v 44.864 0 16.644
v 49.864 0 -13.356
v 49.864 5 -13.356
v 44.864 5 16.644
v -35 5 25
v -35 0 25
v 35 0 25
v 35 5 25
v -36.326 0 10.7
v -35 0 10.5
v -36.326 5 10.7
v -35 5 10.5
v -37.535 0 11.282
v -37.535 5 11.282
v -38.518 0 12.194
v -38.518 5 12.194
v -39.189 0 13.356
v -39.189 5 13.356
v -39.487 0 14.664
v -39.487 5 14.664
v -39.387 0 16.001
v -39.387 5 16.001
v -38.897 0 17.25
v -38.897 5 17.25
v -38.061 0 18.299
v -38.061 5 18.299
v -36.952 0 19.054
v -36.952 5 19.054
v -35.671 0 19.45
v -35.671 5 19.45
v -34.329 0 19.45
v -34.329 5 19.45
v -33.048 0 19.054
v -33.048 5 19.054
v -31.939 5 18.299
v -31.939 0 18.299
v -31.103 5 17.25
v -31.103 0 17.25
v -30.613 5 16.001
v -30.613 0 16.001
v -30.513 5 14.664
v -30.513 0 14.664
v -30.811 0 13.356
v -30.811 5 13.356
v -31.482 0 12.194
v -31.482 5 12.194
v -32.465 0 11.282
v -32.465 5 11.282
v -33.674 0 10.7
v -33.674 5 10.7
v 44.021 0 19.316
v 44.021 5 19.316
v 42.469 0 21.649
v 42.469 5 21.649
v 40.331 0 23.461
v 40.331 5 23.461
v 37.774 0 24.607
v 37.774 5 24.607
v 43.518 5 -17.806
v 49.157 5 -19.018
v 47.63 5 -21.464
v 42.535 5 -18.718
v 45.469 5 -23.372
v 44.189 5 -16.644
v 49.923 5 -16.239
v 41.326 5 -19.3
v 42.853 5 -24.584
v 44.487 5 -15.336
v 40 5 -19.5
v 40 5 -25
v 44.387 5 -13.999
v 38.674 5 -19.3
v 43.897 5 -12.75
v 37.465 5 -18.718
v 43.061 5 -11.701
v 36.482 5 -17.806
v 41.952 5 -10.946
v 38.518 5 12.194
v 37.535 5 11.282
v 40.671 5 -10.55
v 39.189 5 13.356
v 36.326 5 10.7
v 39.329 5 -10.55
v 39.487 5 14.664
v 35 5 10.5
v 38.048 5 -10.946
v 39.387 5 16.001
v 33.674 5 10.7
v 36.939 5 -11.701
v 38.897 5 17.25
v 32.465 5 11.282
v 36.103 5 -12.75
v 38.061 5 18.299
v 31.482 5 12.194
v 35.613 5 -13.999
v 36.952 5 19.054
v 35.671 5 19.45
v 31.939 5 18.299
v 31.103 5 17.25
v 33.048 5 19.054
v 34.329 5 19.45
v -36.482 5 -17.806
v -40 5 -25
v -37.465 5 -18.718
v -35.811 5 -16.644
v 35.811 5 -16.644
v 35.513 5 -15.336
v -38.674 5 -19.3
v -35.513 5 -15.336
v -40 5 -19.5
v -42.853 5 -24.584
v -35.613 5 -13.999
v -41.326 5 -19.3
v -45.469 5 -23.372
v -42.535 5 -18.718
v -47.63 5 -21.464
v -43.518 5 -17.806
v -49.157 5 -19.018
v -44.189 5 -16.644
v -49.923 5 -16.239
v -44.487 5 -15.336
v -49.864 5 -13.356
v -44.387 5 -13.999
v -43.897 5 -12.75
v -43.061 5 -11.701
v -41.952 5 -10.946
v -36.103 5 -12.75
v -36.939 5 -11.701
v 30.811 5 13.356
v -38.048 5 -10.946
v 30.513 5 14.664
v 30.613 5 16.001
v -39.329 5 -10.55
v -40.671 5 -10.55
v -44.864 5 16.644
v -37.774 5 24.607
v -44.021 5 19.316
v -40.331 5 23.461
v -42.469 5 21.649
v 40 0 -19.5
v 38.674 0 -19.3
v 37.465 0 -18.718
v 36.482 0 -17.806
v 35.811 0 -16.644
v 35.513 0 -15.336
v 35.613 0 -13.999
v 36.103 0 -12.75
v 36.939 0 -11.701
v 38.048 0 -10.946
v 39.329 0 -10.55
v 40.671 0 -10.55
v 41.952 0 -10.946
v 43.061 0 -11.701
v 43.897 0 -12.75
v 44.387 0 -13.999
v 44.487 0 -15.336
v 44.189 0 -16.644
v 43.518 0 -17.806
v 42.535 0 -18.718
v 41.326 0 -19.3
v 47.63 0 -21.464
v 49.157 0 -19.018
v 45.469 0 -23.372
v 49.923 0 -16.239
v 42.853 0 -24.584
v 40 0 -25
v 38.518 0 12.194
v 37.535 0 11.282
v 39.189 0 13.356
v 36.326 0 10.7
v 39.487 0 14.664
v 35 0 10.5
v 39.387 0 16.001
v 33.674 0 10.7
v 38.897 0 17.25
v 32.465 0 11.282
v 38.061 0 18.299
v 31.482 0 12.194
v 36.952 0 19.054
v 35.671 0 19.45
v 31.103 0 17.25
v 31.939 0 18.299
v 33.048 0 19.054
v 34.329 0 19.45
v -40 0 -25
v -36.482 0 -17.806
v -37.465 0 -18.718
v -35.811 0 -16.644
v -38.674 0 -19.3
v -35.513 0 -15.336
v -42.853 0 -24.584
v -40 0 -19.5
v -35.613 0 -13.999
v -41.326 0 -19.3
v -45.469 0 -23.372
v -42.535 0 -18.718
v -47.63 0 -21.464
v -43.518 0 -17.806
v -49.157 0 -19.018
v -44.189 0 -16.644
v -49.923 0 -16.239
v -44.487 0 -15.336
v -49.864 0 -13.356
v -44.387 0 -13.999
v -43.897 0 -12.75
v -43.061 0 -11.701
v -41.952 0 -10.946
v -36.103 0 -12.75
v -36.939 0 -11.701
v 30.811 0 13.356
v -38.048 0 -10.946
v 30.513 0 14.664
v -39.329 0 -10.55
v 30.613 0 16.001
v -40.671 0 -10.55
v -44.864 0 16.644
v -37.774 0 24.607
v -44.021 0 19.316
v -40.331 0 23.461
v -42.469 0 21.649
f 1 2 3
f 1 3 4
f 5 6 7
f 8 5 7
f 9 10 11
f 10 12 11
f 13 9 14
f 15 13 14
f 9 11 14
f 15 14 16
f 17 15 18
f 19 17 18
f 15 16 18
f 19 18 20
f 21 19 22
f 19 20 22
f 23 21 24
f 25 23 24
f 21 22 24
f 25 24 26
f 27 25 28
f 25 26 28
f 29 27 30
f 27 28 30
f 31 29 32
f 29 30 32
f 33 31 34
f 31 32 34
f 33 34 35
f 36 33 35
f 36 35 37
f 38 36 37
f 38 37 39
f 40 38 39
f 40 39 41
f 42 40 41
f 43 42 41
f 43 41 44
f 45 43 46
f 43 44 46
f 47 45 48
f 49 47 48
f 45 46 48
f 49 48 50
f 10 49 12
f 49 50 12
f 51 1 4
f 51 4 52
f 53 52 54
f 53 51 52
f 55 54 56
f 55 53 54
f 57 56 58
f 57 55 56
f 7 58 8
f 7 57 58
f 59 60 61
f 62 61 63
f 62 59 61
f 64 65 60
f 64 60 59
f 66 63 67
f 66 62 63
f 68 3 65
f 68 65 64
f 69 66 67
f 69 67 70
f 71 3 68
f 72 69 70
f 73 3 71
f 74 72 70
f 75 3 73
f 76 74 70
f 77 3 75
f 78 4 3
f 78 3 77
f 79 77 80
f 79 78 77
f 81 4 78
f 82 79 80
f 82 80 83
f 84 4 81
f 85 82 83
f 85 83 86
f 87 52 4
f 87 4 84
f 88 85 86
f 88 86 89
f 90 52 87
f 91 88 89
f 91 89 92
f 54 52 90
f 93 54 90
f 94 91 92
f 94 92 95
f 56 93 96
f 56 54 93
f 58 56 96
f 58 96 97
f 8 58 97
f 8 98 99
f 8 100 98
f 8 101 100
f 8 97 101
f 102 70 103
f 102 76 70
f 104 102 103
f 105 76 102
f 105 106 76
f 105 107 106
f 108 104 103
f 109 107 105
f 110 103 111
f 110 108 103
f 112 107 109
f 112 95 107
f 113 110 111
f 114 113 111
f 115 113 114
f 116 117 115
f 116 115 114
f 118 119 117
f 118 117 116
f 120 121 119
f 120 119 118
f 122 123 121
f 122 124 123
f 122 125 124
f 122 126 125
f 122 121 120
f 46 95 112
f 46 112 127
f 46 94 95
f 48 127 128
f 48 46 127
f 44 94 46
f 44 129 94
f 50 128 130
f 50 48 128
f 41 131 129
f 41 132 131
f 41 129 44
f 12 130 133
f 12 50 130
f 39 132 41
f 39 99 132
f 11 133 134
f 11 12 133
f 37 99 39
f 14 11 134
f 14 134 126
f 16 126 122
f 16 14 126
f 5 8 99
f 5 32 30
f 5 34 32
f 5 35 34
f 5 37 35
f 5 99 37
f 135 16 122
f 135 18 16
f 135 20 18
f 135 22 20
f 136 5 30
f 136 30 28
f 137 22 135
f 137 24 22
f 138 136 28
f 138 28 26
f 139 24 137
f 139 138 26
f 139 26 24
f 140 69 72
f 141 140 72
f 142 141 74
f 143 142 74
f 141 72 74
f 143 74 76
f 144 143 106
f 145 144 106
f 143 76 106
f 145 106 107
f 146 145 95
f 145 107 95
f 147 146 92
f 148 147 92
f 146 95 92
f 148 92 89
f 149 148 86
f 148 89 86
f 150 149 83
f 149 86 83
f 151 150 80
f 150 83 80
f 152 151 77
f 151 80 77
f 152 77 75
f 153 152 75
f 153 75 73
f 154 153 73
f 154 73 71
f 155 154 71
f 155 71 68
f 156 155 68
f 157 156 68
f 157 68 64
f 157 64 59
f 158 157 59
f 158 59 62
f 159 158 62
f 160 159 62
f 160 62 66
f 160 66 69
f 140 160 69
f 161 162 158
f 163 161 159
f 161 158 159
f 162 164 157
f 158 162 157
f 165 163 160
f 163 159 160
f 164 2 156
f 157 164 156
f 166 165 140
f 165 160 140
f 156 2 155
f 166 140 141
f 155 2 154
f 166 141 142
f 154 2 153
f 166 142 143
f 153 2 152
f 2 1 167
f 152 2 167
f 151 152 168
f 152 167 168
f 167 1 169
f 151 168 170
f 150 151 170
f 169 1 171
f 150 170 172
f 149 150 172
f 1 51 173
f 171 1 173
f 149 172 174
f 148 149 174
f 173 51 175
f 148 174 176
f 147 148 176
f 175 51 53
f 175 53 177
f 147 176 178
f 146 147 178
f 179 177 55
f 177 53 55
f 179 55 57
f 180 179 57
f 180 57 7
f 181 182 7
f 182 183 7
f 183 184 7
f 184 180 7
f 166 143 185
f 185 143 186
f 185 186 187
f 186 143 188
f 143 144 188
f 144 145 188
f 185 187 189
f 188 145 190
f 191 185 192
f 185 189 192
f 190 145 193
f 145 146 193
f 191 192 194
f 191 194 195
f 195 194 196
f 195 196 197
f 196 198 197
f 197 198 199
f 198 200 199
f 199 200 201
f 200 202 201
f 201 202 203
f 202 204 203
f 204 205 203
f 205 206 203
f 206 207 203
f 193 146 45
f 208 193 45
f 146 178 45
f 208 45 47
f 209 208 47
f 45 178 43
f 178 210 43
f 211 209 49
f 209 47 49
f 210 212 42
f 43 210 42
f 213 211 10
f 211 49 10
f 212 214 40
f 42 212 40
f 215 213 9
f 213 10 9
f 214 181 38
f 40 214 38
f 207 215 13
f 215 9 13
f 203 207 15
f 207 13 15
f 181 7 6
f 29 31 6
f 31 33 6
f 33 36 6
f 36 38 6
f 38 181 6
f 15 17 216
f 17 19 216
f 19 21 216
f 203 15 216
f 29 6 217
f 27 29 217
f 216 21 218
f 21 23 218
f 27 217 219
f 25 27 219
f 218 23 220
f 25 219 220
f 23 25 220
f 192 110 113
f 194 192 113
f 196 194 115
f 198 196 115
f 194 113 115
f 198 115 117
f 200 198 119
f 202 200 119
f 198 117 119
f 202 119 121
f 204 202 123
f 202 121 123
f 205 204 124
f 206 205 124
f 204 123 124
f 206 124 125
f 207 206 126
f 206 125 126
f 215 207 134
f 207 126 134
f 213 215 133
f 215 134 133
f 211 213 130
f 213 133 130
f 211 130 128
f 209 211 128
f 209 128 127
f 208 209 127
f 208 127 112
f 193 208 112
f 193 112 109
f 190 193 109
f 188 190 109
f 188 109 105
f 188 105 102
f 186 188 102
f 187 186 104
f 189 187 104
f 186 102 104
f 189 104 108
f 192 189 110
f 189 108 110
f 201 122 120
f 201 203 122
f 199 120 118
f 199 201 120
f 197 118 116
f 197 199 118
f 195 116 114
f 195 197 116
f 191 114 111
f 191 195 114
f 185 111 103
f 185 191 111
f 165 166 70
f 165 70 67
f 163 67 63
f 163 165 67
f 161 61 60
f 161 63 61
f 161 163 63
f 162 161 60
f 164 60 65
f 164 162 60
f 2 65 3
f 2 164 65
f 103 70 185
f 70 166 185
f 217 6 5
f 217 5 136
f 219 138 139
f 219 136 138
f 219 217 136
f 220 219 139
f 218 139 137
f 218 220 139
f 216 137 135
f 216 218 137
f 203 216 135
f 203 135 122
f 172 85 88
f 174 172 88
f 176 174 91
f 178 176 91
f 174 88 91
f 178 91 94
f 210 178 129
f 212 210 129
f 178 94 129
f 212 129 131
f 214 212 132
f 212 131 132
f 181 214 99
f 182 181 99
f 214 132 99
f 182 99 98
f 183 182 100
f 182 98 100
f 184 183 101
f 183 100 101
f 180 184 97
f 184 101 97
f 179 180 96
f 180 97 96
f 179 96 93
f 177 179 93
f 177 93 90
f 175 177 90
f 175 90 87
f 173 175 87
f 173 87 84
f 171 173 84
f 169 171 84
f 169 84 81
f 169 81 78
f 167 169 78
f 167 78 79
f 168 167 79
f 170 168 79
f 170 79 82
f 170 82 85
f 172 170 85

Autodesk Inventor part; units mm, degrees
ref_plane "YZ Plane" through (0, 0, 0) normal (1, 0, 0) x (0, 1, 0)
ref_plane "XZ Plane" through (0, 0, 0) normal (0, 1, 0) x (-1, 0, 0)
ref_plane "XY Plane" through (0, 0, 0) normal (0, 0, 1) x (1, 0, 0)
sketch "Sketch1" plane through (0, 0, 0) normal (0, 1, 0) x (-1, 0, 0)
  line L0 (-40, -25) -> (40, -25)
  line L1 (35, 25) -> (-35, 25)
  line L2 (-49.8639, -13.356) -> (-44.8639, 16.644)
  line L3 (44.8639, 16.644) -> (49.8639, -13.356)
  circle A0 centre (-35, 15) radius 10
  circle A1 centre (-40, -15) radius 10
  circle A2 centre (35, 15) radius 10
  circle A3 centre (40, -15) radius 10
  line L4 (-35, 5) -> (35, 5)
  line L5 (-40, -5) -> (40, -5)
  line L6 (30.1361, -16.644) -> (25.1361, 13.356)
  line L7 (-25.1361, 13.356) -> (-30.1361, -16.644)
  point P0 (0, 0)
  point P1 (51.8046, -25)
  point P2 (0, 25)
  point P3 (0, -25)
  point P4 (0, -25)
  point P5 (-44.8639, 16.644)
  dimension "d22" = 70
  dimension "d23" = 50
  dimension "d24" = 25
  dimension "d25" = 80
  dimension "d26" = 20
extrude "Extrusion1" add sketch "Sketch1" along normal blind 5
hole "Hole2" at (-35, 0, 15) direction (0, 1, 0) diameter 9 end through all clearance for "Hex Head Cap Screw ISO 24017" size "M8" standard "ISO"
pattern_sketch "Sketch Driven Pattern1" of "Hole2" from (-35, 0, 15) copies at (-40, 0, -15) at (40, 0, -15) at (35, 0, 15)
equation "\"d24\" = 0.5 * d23"
properties part number "PWTR-0085" material "Aluminum 6061"
